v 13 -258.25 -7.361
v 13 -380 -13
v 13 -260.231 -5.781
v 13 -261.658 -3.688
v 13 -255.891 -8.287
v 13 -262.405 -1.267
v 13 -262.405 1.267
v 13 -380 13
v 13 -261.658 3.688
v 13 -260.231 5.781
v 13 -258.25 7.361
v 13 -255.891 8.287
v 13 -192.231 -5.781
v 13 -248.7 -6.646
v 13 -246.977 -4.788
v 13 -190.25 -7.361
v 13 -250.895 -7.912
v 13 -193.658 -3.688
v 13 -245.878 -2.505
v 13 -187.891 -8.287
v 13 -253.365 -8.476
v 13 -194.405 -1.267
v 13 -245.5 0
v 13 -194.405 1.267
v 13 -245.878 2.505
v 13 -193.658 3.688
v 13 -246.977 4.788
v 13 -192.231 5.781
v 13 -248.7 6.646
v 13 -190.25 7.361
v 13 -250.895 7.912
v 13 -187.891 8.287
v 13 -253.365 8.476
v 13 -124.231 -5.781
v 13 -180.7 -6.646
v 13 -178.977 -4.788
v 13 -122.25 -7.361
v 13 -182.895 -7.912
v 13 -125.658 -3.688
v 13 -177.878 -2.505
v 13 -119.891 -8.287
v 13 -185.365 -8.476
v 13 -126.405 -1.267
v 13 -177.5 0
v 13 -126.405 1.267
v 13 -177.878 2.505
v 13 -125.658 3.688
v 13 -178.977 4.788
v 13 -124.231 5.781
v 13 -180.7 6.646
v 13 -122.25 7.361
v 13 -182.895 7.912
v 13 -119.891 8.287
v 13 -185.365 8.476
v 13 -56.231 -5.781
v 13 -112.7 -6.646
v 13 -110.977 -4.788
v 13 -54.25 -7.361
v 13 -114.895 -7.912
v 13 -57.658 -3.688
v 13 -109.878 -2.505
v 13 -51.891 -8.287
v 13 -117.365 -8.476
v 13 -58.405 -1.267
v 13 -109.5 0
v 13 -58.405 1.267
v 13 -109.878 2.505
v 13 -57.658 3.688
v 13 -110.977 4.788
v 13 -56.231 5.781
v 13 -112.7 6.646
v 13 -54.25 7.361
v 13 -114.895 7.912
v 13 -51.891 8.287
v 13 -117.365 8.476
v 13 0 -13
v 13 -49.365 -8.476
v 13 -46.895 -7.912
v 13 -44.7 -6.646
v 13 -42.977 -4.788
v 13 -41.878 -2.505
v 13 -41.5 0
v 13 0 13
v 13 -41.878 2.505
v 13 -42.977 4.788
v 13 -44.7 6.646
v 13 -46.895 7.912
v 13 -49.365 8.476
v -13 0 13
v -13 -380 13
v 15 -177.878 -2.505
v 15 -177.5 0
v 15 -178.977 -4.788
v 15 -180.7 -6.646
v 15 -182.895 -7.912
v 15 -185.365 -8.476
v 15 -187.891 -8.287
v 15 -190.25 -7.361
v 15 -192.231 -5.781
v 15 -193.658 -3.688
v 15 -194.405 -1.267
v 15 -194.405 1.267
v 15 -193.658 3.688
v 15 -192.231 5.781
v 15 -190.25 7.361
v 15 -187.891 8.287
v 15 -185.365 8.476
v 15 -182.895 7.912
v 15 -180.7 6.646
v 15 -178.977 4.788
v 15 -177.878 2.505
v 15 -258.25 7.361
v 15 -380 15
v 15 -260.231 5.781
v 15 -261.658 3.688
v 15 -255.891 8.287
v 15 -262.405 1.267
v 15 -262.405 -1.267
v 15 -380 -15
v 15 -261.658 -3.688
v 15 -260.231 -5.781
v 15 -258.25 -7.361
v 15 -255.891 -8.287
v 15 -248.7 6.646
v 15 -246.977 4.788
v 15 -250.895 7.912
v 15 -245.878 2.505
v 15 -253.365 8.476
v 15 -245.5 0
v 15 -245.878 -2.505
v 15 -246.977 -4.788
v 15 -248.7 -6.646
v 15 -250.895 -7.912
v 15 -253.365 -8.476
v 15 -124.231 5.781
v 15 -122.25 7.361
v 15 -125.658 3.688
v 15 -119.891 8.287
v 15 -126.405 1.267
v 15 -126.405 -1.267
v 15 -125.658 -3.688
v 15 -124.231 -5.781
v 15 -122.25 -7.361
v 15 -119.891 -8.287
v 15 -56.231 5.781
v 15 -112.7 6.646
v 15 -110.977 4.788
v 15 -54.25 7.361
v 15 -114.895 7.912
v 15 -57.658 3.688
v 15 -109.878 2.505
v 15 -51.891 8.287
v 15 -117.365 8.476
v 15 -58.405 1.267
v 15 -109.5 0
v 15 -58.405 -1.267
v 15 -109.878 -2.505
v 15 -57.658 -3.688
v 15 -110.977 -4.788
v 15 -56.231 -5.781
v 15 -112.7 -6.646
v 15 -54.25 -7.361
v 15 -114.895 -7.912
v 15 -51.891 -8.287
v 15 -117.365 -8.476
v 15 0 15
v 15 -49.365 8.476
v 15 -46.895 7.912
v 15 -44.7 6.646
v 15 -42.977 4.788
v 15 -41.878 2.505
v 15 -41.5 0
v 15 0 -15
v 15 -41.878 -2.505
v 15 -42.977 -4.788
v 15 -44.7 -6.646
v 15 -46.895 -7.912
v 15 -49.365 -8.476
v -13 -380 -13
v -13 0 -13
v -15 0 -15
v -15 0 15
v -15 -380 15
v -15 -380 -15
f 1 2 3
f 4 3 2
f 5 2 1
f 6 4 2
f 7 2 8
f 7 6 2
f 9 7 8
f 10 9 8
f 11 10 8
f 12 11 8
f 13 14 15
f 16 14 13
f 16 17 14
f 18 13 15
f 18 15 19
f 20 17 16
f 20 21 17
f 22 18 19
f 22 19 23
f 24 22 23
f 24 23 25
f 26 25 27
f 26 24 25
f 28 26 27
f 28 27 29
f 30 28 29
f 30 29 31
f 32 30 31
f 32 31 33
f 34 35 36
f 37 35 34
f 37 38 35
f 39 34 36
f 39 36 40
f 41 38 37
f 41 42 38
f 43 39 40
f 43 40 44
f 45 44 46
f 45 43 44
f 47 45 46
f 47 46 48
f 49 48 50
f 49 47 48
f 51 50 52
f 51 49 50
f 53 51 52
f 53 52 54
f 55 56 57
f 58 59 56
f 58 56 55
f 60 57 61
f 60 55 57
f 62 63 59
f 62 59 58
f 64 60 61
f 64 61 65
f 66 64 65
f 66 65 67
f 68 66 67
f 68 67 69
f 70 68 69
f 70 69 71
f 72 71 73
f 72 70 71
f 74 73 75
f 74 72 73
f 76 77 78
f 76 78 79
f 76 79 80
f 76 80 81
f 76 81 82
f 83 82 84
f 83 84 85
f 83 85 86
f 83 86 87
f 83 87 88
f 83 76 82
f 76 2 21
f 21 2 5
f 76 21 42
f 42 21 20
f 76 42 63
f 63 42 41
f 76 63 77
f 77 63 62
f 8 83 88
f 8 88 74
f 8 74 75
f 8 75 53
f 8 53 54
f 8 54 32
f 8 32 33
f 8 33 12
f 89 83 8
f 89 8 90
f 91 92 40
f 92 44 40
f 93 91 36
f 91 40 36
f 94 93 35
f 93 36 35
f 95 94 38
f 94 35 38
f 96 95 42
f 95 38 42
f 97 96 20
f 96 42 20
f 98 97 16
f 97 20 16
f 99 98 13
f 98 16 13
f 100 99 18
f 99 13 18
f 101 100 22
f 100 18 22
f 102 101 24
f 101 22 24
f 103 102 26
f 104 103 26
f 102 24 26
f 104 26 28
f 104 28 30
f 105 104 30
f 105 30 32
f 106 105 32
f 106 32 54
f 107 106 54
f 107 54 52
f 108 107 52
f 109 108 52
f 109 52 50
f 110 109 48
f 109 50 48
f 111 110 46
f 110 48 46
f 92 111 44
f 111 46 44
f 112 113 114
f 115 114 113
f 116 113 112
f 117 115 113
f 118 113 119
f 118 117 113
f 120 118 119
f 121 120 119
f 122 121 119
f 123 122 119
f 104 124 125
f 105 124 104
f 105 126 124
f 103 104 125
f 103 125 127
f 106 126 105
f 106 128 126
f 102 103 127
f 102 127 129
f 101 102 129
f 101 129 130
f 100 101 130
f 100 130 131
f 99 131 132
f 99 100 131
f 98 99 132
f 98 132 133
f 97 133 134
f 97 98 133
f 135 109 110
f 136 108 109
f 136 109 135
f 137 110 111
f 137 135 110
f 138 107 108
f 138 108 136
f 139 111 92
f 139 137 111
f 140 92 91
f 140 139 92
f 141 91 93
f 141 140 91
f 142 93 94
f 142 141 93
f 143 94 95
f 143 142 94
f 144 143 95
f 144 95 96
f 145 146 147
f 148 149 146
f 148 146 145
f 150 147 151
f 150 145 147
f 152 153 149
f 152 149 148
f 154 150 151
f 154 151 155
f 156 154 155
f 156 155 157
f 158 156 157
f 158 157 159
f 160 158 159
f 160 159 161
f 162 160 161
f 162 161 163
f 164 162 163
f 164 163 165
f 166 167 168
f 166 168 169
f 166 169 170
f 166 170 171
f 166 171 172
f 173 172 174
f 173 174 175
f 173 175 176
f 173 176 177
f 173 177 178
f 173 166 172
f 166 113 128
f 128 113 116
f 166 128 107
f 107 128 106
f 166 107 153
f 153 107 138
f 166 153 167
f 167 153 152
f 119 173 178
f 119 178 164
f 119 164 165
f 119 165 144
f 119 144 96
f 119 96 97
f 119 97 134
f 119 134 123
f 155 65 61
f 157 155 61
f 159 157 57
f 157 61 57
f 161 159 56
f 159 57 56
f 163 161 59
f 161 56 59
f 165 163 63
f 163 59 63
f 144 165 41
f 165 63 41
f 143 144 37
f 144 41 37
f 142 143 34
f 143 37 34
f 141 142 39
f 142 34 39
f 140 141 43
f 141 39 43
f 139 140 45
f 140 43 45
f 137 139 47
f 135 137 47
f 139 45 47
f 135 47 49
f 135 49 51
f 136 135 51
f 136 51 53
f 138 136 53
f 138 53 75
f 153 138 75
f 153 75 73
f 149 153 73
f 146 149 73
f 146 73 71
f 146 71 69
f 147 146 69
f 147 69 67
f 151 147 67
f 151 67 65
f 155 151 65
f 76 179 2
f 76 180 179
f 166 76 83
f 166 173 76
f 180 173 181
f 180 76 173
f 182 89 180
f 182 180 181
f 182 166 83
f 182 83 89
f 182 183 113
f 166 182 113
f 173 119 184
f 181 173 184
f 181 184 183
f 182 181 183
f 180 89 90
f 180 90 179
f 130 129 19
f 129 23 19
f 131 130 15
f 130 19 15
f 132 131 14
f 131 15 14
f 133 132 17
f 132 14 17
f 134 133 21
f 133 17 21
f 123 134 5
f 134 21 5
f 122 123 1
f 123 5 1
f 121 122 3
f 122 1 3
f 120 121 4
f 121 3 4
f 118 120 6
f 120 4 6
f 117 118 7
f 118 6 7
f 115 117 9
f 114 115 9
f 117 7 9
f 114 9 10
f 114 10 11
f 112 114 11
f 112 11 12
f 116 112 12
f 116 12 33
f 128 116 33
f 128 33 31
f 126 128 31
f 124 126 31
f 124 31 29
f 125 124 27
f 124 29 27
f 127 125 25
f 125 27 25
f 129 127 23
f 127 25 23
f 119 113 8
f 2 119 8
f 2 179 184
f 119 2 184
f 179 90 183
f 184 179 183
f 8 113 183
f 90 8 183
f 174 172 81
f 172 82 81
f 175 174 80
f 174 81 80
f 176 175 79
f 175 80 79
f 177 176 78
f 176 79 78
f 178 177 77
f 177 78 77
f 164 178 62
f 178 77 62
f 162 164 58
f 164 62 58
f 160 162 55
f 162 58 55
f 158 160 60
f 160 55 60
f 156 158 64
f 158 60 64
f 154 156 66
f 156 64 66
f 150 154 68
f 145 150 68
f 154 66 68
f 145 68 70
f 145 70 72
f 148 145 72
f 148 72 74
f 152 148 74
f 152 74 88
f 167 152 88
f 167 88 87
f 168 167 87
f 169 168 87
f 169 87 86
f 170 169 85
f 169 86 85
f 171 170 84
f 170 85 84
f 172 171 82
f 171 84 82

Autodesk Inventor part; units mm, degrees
ref_plane "YZ Plane" through (0, 0, 0) normal (1, 0, 0) x (0, 1, 0)
ref_plane "XZ Plane" through (0, 0, 0) normal (0, 1, 0) x (-1, 0, 0)
ref_plane "XY Plane" through (0, 0, 0) normal (0, 0, 1) x (1, 0, 0)
sketch "Sketch9" plane through (0, 0, 0) normal (0, 1, 0) x (-1, 0, 0)
  line L0 (15, 15) -> (-15, 15)
  line L1 (-15, 15) -> (-15, -15)
  line L2 (-15, -15) -> (15, -15)
  line L3 (15, -15) -> (15, 15)
  line L4 (15, 15) -> (-15, -15) construction
  line L5 (-15, 15) -> (15, -15) construction
  line L6 (-13, 13) -> (13, 13)
  line L7 (13, 13) -> (13, -13)
  line L8 (13, -13) -> (-13, -13)
  line L9 (-13, -13) -> (-13, 13)
  point P0 (0, 0)
  dimension "d172" = 30
  dimension "d173" = 30
  dimension "d174" = 2
extrude "Extrusion3" add sketch "Sketch9" against normal blind 380
sketch "Sketch10" plane through (0, 0, 0) normal (1, 0, 0) x (0, 1, 0)
  line L0 (0, 15) -> (0, -15) construction
  line L1 (0, 15) -> (-380, 15) construction
  line L2 (0, -15) -> (-380, -15) construction
  line L3 (-58.5, 8.5) -> (-41.5, 8.5)
  line L4 (-41.5, 8.5) -> (-41.5, -8.5)
  line L5 (-41.5, -8.5) -> (-58.5, -8.5)
  line L6 (-58.5, -8.5) -> (-58.5, 8.5)
  line L7 (-58.5, 8.5) -> (-41.5, -8.5) construction
  line L8 (-41.5, 8.5) -> (-58.5, -8.5) construction
  line L9 (0, 0) -> (30, 0)
  circle A0 centre (-50, 0) radius 8.5
  dimension "d177" = 17
  dimension "d178" = 17
  dimension "d181" = 30
  dimension "d182" = 80
extrude "Extrusion4" cut sketch "Sketch10" along normal through all contours A0
pattern_linear "Rectangular Pattern4" count 4 spacing 68 along (0, -1, 0) of "Extrusion4"
properties part number "PRS 1662 DrSysB way tube 4_D1200" material "Stainless Steel"
